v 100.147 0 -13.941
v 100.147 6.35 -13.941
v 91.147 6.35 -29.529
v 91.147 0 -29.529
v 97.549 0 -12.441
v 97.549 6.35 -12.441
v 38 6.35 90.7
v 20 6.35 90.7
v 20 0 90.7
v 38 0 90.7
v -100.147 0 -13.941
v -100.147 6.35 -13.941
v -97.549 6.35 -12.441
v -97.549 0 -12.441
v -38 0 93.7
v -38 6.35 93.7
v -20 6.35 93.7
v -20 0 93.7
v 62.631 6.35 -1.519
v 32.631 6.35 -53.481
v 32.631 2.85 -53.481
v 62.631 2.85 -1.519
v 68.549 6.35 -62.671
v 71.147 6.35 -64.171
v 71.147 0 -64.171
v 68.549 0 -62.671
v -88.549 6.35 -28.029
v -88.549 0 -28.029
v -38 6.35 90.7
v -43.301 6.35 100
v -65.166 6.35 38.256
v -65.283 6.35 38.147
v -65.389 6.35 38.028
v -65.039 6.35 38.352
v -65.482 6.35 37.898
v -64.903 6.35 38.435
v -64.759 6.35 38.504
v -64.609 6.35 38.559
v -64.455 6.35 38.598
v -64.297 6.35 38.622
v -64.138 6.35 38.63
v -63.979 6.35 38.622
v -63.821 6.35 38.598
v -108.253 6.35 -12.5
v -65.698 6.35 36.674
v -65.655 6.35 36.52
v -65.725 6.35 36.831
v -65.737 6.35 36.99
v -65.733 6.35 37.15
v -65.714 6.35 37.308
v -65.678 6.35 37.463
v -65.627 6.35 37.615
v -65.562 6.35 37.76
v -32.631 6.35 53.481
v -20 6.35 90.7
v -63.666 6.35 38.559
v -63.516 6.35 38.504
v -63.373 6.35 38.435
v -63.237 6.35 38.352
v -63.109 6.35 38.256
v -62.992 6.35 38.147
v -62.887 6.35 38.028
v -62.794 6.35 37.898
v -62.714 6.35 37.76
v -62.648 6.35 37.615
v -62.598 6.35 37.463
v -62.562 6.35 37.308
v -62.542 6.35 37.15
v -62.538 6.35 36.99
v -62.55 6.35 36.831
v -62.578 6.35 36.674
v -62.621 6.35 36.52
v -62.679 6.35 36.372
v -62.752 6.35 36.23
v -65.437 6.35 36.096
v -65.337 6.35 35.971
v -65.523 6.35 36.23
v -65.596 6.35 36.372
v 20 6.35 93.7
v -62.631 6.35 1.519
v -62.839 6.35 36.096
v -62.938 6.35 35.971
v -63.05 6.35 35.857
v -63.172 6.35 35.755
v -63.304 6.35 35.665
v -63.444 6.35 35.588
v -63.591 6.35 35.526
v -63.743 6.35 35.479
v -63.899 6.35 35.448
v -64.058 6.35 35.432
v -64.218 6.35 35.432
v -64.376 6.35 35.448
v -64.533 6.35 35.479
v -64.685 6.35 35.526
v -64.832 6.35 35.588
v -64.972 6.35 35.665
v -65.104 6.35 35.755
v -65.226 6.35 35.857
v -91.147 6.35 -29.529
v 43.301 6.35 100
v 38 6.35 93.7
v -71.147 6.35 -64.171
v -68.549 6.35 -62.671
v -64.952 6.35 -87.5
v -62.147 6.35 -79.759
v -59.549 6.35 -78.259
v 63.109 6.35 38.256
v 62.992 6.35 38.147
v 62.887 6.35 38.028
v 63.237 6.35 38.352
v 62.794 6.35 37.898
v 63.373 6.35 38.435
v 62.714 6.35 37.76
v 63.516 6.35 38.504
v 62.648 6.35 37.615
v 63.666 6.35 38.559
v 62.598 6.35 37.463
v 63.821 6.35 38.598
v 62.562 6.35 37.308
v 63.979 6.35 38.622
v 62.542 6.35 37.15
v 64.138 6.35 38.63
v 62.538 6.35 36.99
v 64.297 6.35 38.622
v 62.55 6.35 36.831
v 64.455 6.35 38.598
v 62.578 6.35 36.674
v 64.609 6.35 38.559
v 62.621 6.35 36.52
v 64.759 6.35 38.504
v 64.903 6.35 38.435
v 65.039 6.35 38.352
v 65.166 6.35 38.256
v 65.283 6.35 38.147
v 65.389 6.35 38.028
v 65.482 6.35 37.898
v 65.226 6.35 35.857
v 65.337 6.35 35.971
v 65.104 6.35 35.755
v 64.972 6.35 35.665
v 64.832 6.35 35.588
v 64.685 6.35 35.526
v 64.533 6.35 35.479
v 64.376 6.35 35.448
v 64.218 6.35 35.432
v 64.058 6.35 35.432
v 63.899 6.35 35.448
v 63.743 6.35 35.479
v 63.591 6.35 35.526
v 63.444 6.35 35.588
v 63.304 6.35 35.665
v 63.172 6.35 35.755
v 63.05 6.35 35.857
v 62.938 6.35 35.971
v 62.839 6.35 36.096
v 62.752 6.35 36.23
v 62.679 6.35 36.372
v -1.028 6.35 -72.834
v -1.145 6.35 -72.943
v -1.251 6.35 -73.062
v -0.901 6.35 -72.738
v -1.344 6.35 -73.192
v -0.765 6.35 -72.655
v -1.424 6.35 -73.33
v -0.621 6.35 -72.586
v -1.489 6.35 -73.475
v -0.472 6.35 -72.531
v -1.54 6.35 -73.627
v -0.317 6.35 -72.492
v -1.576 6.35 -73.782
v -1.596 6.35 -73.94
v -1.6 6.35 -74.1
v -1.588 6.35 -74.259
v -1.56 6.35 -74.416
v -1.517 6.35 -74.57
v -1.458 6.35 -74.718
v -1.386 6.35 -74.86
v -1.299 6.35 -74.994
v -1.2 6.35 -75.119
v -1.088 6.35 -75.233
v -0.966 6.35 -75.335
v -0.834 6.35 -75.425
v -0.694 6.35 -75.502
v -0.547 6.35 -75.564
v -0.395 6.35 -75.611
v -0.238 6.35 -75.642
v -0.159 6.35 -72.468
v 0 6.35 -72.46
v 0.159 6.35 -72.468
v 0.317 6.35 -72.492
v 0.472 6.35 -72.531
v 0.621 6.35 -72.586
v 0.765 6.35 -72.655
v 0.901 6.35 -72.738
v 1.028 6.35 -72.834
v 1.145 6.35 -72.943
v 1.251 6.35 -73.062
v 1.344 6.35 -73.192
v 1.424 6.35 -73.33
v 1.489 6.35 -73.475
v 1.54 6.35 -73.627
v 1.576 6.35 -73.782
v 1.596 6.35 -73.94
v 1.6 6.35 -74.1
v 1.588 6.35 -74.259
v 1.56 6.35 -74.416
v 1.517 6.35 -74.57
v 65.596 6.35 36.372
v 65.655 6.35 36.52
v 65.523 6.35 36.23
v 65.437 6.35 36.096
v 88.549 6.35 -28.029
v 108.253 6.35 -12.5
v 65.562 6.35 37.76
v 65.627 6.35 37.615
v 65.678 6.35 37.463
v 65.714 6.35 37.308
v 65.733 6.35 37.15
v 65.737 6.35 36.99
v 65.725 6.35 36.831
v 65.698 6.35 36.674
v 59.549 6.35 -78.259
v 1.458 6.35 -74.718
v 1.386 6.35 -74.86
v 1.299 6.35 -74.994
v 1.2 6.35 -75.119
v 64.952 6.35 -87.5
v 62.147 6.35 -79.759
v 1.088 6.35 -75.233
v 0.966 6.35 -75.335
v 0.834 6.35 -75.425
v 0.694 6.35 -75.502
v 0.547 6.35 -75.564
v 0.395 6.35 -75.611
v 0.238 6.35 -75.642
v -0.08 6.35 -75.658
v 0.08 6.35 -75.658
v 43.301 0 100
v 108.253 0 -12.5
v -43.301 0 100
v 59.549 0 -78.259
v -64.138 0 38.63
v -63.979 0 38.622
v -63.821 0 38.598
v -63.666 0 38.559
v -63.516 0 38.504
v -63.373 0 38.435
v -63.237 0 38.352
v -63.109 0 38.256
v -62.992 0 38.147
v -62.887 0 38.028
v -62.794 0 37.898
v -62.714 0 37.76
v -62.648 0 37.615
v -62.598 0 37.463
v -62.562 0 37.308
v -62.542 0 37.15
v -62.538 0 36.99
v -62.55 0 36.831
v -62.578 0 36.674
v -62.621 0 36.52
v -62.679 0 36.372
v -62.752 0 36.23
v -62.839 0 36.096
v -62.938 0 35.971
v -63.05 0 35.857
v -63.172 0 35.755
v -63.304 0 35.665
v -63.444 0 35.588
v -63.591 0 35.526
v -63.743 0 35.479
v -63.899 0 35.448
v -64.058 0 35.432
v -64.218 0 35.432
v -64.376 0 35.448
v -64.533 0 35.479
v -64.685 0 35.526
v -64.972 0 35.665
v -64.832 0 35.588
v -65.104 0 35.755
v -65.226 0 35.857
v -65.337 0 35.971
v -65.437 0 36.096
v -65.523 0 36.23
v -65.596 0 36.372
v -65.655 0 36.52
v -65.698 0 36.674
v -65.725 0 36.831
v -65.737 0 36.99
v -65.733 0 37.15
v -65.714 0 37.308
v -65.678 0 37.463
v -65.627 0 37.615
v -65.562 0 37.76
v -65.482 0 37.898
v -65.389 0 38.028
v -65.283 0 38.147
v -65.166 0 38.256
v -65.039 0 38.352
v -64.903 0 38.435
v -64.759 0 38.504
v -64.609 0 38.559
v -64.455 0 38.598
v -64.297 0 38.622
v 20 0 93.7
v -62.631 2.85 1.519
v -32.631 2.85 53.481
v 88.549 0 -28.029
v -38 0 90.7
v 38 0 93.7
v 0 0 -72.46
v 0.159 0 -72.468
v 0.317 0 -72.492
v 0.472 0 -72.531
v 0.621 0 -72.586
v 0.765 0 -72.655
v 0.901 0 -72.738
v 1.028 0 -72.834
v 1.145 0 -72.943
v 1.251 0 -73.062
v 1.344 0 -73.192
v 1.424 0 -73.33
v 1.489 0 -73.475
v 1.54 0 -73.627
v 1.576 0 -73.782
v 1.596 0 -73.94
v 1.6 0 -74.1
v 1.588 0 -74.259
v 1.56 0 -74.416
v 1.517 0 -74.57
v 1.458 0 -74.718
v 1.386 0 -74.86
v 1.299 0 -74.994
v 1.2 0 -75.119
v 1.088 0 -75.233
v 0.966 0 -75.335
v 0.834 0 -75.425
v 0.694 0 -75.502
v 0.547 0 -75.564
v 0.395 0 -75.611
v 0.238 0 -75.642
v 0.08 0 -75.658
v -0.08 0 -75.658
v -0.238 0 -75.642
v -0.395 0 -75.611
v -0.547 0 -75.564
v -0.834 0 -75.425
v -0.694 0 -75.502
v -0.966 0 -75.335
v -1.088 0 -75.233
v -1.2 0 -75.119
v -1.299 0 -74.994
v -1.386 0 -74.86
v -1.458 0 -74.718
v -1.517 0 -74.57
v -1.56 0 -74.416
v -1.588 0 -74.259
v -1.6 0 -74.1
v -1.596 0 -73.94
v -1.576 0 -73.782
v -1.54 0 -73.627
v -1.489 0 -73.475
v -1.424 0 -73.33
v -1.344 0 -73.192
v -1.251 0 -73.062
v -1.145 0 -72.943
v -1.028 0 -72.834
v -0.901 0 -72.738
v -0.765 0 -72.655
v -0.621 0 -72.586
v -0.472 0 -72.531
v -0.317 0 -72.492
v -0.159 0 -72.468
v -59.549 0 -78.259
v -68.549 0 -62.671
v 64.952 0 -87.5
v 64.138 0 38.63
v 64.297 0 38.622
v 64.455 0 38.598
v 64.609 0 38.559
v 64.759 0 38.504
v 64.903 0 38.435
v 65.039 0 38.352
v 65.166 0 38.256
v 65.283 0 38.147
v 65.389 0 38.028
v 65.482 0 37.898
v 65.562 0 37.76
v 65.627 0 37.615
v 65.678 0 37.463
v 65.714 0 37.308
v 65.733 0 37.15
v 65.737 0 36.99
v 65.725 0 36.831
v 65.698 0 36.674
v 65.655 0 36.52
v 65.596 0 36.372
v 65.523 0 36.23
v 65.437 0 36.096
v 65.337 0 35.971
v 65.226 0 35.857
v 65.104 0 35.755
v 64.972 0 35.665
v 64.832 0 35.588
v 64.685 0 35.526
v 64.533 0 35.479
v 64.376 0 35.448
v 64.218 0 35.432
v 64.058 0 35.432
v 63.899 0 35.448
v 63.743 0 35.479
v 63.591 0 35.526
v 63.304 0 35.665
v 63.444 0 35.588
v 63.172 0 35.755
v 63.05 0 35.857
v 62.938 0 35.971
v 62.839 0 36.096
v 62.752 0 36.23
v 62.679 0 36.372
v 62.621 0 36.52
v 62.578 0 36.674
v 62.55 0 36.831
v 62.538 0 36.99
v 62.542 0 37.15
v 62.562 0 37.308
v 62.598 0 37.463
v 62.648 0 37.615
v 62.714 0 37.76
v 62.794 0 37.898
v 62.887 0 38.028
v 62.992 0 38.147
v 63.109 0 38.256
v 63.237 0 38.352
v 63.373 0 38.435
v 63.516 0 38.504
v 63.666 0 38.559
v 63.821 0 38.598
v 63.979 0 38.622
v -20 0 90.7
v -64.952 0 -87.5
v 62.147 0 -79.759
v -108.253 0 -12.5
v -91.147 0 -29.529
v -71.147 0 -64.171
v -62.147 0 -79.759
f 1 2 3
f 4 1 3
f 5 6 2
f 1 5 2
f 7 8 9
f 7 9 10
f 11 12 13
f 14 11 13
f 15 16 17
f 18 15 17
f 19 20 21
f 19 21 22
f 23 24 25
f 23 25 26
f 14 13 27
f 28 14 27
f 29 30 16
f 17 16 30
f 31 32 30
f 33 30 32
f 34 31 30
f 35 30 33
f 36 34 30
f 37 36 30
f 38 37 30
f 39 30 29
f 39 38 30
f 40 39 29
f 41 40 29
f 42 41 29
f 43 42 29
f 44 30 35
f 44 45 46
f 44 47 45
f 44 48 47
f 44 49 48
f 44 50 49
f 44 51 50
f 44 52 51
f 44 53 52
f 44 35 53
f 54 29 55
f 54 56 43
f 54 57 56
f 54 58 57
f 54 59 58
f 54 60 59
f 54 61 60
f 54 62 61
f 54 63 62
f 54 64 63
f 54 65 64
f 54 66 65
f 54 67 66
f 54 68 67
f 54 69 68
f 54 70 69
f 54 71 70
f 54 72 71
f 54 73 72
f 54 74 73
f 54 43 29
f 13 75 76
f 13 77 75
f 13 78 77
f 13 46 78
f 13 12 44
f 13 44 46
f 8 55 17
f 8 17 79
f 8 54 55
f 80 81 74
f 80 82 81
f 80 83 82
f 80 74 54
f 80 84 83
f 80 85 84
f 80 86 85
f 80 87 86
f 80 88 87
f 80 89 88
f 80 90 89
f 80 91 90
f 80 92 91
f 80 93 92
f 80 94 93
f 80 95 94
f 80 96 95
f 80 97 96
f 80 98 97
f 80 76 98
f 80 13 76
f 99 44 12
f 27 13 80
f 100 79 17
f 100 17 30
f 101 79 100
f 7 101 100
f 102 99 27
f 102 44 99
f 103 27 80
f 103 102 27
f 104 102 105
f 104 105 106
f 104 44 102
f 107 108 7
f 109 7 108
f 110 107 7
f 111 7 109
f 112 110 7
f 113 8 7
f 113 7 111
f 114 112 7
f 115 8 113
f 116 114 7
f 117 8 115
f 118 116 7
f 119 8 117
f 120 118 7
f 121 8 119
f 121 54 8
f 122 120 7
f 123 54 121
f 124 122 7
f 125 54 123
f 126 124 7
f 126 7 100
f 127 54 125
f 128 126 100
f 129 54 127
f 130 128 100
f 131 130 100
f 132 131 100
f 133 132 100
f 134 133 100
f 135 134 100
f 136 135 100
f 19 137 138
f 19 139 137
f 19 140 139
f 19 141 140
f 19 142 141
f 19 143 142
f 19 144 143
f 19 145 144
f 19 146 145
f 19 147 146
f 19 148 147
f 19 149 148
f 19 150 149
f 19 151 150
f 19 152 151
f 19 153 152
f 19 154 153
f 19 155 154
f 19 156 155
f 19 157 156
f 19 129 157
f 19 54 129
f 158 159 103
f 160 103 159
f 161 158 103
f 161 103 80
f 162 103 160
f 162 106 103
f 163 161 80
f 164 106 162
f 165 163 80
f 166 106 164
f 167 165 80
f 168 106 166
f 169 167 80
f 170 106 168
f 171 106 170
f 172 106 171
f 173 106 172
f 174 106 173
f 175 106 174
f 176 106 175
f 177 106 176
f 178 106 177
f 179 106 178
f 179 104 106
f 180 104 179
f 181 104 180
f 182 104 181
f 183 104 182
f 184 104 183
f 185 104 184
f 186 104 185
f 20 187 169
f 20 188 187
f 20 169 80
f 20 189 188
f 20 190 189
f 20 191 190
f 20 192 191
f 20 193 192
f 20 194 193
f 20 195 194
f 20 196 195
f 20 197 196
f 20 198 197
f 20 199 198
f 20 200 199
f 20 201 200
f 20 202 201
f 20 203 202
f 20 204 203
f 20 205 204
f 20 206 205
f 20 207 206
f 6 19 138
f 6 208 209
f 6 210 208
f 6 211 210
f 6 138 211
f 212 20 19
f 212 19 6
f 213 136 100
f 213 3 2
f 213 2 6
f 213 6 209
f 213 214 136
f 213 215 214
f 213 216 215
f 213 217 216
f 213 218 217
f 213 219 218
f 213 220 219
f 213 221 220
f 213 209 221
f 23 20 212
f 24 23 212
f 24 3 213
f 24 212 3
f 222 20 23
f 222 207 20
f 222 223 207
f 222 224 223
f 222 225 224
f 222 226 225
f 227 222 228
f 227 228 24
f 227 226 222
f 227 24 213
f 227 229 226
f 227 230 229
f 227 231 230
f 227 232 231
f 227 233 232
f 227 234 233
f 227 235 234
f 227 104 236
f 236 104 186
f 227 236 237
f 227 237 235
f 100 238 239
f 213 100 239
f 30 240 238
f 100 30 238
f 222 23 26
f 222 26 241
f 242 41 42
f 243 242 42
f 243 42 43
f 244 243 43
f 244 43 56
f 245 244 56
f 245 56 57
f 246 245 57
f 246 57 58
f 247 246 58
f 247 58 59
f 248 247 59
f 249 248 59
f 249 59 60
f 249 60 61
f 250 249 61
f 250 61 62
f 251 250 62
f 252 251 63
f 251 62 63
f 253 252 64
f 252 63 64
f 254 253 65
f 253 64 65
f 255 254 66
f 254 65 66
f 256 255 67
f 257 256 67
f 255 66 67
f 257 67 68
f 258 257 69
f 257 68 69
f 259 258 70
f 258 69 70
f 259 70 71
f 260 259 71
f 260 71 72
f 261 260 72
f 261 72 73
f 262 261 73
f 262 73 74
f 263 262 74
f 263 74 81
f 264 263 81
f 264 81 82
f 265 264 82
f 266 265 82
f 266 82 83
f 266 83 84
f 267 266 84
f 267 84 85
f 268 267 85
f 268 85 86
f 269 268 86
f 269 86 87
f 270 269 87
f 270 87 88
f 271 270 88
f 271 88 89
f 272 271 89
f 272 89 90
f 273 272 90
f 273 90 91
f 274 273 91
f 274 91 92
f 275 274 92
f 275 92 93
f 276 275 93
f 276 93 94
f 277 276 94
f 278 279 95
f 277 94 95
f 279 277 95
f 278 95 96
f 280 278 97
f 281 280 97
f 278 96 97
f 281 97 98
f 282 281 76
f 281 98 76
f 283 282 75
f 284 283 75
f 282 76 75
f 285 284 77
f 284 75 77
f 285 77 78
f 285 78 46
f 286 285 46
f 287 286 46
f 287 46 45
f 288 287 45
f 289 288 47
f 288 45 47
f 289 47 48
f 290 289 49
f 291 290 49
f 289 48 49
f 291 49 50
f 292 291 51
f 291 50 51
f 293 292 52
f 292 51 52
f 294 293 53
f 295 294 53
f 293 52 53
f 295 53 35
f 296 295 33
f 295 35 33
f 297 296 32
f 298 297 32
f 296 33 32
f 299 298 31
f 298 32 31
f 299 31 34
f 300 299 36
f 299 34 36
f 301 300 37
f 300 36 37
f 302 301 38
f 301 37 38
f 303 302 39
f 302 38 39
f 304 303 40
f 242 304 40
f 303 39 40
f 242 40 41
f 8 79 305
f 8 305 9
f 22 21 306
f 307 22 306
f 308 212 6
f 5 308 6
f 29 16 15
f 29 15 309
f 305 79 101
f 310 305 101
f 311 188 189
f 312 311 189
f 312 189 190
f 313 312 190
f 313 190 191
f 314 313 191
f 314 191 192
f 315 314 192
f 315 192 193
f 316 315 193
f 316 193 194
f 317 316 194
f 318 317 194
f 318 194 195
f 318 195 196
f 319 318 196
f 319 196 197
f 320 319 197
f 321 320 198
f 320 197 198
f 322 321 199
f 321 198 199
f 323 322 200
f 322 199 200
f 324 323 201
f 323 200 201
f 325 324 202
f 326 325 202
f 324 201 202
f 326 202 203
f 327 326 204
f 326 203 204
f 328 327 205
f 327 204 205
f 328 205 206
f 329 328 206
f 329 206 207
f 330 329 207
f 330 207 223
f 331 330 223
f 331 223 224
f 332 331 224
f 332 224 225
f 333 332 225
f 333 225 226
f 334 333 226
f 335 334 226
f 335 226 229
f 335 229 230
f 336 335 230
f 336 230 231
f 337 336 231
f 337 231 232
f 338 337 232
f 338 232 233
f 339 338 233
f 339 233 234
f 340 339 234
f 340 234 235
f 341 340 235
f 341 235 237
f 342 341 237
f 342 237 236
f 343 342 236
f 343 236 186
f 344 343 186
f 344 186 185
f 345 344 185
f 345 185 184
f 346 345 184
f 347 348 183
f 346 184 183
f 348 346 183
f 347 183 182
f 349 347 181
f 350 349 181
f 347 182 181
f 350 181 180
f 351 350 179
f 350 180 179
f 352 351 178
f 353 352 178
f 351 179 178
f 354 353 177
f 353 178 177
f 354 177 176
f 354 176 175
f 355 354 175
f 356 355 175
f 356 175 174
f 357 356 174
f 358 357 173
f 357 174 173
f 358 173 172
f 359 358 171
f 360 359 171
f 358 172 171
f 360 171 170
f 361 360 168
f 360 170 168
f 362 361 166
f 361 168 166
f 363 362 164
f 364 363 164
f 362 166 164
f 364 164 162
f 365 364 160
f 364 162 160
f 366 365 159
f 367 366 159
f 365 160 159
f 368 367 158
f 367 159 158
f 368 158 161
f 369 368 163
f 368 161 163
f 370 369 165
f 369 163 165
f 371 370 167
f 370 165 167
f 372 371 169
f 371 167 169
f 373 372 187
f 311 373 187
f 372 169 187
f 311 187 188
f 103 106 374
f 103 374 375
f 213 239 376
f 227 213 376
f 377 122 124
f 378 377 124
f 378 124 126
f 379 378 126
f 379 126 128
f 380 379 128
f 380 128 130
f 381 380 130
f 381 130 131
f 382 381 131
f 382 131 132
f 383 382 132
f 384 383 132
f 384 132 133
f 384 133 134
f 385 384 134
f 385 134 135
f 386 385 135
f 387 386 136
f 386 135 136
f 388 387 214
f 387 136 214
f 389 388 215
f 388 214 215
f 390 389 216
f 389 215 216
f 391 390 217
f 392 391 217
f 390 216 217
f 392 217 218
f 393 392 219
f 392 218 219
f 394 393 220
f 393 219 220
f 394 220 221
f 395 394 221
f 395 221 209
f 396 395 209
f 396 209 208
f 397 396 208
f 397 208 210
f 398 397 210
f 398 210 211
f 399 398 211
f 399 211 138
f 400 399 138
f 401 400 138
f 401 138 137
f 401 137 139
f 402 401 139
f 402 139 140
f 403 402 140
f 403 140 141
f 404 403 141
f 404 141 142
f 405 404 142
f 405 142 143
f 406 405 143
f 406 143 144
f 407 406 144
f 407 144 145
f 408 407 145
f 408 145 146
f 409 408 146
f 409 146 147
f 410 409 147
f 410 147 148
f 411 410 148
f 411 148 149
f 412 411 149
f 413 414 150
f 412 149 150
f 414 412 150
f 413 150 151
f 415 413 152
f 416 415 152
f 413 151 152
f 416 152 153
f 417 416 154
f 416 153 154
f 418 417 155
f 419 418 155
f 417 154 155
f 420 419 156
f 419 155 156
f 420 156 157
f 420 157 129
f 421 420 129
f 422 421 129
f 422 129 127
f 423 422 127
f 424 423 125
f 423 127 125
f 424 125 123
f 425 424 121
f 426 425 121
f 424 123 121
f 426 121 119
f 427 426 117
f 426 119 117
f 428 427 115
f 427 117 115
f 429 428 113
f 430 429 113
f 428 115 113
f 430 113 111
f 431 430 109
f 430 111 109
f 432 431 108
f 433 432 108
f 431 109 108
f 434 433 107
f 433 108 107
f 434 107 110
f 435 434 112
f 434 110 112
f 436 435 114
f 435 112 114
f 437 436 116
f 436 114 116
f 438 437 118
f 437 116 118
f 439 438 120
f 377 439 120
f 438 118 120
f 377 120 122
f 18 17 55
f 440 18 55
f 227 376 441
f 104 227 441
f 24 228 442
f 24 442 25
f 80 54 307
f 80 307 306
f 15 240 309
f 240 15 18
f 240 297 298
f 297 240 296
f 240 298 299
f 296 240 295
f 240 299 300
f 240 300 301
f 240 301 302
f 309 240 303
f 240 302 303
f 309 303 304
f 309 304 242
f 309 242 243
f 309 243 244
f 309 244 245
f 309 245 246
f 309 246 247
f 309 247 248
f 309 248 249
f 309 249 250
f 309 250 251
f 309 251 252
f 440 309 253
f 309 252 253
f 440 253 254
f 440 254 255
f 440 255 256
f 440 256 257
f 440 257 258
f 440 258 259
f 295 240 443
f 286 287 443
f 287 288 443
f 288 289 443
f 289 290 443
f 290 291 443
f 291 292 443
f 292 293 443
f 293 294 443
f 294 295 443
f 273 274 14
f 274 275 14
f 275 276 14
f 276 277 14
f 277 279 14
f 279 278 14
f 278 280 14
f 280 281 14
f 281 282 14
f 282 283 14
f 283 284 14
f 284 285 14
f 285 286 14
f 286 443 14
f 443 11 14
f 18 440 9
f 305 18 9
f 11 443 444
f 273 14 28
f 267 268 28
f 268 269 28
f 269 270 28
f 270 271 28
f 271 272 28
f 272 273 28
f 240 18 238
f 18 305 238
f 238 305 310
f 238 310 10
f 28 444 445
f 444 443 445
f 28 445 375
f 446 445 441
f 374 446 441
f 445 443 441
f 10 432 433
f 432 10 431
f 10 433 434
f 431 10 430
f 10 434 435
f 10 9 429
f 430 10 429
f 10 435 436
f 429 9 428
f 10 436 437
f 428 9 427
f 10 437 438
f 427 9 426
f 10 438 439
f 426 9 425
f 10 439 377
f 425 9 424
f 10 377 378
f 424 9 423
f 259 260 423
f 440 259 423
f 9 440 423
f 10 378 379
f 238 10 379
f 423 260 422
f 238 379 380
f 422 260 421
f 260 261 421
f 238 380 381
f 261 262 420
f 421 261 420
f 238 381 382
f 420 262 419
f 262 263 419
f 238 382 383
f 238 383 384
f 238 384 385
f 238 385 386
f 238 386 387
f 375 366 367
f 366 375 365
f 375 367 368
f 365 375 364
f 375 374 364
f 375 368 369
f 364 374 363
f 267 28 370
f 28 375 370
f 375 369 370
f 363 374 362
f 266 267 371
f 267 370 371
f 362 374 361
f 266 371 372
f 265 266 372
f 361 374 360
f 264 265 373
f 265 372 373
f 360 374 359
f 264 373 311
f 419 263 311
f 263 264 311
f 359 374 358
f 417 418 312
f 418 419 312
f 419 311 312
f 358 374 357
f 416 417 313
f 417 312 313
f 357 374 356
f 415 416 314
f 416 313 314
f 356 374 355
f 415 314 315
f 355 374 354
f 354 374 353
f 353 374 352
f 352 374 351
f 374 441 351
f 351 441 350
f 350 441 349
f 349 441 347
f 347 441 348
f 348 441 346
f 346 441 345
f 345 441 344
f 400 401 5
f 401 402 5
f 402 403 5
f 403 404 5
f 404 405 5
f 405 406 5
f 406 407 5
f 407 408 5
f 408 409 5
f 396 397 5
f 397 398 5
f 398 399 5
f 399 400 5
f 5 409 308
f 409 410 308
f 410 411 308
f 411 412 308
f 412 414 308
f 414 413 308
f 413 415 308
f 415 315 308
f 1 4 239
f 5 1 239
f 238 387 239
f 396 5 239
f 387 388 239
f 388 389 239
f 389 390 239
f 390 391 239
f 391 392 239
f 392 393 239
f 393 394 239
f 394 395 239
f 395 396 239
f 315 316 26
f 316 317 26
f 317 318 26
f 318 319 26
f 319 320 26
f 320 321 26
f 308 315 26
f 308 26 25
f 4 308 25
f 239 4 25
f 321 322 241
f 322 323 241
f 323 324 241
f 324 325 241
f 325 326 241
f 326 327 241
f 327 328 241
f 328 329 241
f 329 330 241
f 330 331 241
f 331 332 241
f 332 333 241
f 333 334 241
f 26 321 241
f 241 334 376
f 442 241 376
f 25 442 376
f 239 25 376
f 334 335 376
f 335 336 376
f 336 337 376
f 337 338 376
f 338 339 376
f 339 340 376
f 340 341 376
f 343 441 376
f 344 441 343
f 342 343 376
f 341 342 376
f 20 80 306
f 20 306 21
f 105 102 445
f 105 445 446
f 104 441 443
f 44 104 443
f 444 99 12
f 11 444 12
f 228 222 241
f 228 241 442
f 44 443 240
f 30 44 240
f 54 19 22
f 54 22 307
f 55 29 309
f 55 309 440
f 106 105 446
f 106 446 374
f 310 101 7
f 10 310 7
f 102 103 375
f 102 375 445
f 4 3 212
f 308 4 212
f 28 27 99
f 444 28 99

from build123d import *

# Parameters (mm, degrees)
BOSS_EXTRUDE1_DEPTH = 6.35
SKETCH2_W           = 18
SKETCH2_H           = 3
CUT_EXTRUDE1_DEPTH  = 148.509567486
CUT_EXTRUDE2_DEPTH  = 3.5
SKETCH8_R           = 1.6
CUT_EXTRUDE3_DEPTH  = 148.509567486


with BuildPart() as part:
    # Sketch1 → Boss-Extrude1 (new body)
    with BuildSketch(Plane(origin=(0, 0, 0), x_dir=(1, 0, 0), z_dir=(0, 1, 0))):
        Polygon((64.951905284, 87.5), (-64.951905284, 87.5), (-108.253175473, 12.5), (-43.301270189, -100), (43.301270189, -100), (108.253175473, 12.5), align=None)
    extrude(amount=BOSS_EXTRUDE1_DEPTH)

    # Sketch2 → Cut-Extrude1 (cut, through all)
    with BuildSketch(Plane(origin=(0, 6.35, 0), x_dir=(1, 0, 0), z_dir=(0, 1, 0))):
        with Locations((-29, -92.2)):
            Rectangle(SKETCH2_W, SKETCH2_H)
        with Locations((29, -92.2)):
            Rectangle(SKETCH2_W, SKETCH2_H)
        Polygon((-62.146580335, 79.758965344), (-59.548504123, 78.258965344), (-68.548504123, 62.670508076), (-71.146580335, 64.170508076), align=None)
        Polygon((-97.548504123, 12.441034656), (-88.548504123, 28.029491924), (-91.146580335, 29.529491924), (-100.146580335, 13.941034656), align=None)
        Polygon((100.146580335, 13.941034656), (91.146580335, 29.529491924), (88.548504123, 28.029491924), (97.548504123, 12.441034656), align=None)
        Polygon((59.548504123, 78.258965344), (62.146580335, 79.758965344), (71.146580335, 64.170508076), (68.548504123, 62.670508076), align=None)
    extrude(amount=-CUT_EXTRUDE1_DEPTH, mode=Mode.SUBTRACT)

    # Sketch4 → Cut-Extrude2 (cut)
    with BuildSketch(Plane(origin=(0, 6.35, 0), x_dir=(1, 0, 0), z_dir=(0, 1, 0))):
        Polygon((-62.631397208, -1.519237886), (32.631397208, 53.480762114), (62.631397208, 1.519237886), (-32.631397208, -53.480762114), align=None)
    extrude(amount=-CUT_EXTRUDE2_DEPTH, mode=Mode.SUBTRACT)

    # Sketch8 → Cut-Extrude3 (cut, through all)
    with BuildSketch(Plane(origin=(0, 6.35, 0), x_dir=(1, 0, 0), z_dir=(0, 1, 0))):
        with Locations((-64.137841404, -37.03)):
            Circle(SKETCH8_R)
        with Locations((64.137841404, -37.03)):
            Circle(SKETCH8_R)
        with Locations((0, 74.06)):
            Circle(SKETCH8_R)
    extrude(amount=-CUT_EXTRUDE3_DEPTH, mode=Mode.SUBTRACT)


solid = part.part
